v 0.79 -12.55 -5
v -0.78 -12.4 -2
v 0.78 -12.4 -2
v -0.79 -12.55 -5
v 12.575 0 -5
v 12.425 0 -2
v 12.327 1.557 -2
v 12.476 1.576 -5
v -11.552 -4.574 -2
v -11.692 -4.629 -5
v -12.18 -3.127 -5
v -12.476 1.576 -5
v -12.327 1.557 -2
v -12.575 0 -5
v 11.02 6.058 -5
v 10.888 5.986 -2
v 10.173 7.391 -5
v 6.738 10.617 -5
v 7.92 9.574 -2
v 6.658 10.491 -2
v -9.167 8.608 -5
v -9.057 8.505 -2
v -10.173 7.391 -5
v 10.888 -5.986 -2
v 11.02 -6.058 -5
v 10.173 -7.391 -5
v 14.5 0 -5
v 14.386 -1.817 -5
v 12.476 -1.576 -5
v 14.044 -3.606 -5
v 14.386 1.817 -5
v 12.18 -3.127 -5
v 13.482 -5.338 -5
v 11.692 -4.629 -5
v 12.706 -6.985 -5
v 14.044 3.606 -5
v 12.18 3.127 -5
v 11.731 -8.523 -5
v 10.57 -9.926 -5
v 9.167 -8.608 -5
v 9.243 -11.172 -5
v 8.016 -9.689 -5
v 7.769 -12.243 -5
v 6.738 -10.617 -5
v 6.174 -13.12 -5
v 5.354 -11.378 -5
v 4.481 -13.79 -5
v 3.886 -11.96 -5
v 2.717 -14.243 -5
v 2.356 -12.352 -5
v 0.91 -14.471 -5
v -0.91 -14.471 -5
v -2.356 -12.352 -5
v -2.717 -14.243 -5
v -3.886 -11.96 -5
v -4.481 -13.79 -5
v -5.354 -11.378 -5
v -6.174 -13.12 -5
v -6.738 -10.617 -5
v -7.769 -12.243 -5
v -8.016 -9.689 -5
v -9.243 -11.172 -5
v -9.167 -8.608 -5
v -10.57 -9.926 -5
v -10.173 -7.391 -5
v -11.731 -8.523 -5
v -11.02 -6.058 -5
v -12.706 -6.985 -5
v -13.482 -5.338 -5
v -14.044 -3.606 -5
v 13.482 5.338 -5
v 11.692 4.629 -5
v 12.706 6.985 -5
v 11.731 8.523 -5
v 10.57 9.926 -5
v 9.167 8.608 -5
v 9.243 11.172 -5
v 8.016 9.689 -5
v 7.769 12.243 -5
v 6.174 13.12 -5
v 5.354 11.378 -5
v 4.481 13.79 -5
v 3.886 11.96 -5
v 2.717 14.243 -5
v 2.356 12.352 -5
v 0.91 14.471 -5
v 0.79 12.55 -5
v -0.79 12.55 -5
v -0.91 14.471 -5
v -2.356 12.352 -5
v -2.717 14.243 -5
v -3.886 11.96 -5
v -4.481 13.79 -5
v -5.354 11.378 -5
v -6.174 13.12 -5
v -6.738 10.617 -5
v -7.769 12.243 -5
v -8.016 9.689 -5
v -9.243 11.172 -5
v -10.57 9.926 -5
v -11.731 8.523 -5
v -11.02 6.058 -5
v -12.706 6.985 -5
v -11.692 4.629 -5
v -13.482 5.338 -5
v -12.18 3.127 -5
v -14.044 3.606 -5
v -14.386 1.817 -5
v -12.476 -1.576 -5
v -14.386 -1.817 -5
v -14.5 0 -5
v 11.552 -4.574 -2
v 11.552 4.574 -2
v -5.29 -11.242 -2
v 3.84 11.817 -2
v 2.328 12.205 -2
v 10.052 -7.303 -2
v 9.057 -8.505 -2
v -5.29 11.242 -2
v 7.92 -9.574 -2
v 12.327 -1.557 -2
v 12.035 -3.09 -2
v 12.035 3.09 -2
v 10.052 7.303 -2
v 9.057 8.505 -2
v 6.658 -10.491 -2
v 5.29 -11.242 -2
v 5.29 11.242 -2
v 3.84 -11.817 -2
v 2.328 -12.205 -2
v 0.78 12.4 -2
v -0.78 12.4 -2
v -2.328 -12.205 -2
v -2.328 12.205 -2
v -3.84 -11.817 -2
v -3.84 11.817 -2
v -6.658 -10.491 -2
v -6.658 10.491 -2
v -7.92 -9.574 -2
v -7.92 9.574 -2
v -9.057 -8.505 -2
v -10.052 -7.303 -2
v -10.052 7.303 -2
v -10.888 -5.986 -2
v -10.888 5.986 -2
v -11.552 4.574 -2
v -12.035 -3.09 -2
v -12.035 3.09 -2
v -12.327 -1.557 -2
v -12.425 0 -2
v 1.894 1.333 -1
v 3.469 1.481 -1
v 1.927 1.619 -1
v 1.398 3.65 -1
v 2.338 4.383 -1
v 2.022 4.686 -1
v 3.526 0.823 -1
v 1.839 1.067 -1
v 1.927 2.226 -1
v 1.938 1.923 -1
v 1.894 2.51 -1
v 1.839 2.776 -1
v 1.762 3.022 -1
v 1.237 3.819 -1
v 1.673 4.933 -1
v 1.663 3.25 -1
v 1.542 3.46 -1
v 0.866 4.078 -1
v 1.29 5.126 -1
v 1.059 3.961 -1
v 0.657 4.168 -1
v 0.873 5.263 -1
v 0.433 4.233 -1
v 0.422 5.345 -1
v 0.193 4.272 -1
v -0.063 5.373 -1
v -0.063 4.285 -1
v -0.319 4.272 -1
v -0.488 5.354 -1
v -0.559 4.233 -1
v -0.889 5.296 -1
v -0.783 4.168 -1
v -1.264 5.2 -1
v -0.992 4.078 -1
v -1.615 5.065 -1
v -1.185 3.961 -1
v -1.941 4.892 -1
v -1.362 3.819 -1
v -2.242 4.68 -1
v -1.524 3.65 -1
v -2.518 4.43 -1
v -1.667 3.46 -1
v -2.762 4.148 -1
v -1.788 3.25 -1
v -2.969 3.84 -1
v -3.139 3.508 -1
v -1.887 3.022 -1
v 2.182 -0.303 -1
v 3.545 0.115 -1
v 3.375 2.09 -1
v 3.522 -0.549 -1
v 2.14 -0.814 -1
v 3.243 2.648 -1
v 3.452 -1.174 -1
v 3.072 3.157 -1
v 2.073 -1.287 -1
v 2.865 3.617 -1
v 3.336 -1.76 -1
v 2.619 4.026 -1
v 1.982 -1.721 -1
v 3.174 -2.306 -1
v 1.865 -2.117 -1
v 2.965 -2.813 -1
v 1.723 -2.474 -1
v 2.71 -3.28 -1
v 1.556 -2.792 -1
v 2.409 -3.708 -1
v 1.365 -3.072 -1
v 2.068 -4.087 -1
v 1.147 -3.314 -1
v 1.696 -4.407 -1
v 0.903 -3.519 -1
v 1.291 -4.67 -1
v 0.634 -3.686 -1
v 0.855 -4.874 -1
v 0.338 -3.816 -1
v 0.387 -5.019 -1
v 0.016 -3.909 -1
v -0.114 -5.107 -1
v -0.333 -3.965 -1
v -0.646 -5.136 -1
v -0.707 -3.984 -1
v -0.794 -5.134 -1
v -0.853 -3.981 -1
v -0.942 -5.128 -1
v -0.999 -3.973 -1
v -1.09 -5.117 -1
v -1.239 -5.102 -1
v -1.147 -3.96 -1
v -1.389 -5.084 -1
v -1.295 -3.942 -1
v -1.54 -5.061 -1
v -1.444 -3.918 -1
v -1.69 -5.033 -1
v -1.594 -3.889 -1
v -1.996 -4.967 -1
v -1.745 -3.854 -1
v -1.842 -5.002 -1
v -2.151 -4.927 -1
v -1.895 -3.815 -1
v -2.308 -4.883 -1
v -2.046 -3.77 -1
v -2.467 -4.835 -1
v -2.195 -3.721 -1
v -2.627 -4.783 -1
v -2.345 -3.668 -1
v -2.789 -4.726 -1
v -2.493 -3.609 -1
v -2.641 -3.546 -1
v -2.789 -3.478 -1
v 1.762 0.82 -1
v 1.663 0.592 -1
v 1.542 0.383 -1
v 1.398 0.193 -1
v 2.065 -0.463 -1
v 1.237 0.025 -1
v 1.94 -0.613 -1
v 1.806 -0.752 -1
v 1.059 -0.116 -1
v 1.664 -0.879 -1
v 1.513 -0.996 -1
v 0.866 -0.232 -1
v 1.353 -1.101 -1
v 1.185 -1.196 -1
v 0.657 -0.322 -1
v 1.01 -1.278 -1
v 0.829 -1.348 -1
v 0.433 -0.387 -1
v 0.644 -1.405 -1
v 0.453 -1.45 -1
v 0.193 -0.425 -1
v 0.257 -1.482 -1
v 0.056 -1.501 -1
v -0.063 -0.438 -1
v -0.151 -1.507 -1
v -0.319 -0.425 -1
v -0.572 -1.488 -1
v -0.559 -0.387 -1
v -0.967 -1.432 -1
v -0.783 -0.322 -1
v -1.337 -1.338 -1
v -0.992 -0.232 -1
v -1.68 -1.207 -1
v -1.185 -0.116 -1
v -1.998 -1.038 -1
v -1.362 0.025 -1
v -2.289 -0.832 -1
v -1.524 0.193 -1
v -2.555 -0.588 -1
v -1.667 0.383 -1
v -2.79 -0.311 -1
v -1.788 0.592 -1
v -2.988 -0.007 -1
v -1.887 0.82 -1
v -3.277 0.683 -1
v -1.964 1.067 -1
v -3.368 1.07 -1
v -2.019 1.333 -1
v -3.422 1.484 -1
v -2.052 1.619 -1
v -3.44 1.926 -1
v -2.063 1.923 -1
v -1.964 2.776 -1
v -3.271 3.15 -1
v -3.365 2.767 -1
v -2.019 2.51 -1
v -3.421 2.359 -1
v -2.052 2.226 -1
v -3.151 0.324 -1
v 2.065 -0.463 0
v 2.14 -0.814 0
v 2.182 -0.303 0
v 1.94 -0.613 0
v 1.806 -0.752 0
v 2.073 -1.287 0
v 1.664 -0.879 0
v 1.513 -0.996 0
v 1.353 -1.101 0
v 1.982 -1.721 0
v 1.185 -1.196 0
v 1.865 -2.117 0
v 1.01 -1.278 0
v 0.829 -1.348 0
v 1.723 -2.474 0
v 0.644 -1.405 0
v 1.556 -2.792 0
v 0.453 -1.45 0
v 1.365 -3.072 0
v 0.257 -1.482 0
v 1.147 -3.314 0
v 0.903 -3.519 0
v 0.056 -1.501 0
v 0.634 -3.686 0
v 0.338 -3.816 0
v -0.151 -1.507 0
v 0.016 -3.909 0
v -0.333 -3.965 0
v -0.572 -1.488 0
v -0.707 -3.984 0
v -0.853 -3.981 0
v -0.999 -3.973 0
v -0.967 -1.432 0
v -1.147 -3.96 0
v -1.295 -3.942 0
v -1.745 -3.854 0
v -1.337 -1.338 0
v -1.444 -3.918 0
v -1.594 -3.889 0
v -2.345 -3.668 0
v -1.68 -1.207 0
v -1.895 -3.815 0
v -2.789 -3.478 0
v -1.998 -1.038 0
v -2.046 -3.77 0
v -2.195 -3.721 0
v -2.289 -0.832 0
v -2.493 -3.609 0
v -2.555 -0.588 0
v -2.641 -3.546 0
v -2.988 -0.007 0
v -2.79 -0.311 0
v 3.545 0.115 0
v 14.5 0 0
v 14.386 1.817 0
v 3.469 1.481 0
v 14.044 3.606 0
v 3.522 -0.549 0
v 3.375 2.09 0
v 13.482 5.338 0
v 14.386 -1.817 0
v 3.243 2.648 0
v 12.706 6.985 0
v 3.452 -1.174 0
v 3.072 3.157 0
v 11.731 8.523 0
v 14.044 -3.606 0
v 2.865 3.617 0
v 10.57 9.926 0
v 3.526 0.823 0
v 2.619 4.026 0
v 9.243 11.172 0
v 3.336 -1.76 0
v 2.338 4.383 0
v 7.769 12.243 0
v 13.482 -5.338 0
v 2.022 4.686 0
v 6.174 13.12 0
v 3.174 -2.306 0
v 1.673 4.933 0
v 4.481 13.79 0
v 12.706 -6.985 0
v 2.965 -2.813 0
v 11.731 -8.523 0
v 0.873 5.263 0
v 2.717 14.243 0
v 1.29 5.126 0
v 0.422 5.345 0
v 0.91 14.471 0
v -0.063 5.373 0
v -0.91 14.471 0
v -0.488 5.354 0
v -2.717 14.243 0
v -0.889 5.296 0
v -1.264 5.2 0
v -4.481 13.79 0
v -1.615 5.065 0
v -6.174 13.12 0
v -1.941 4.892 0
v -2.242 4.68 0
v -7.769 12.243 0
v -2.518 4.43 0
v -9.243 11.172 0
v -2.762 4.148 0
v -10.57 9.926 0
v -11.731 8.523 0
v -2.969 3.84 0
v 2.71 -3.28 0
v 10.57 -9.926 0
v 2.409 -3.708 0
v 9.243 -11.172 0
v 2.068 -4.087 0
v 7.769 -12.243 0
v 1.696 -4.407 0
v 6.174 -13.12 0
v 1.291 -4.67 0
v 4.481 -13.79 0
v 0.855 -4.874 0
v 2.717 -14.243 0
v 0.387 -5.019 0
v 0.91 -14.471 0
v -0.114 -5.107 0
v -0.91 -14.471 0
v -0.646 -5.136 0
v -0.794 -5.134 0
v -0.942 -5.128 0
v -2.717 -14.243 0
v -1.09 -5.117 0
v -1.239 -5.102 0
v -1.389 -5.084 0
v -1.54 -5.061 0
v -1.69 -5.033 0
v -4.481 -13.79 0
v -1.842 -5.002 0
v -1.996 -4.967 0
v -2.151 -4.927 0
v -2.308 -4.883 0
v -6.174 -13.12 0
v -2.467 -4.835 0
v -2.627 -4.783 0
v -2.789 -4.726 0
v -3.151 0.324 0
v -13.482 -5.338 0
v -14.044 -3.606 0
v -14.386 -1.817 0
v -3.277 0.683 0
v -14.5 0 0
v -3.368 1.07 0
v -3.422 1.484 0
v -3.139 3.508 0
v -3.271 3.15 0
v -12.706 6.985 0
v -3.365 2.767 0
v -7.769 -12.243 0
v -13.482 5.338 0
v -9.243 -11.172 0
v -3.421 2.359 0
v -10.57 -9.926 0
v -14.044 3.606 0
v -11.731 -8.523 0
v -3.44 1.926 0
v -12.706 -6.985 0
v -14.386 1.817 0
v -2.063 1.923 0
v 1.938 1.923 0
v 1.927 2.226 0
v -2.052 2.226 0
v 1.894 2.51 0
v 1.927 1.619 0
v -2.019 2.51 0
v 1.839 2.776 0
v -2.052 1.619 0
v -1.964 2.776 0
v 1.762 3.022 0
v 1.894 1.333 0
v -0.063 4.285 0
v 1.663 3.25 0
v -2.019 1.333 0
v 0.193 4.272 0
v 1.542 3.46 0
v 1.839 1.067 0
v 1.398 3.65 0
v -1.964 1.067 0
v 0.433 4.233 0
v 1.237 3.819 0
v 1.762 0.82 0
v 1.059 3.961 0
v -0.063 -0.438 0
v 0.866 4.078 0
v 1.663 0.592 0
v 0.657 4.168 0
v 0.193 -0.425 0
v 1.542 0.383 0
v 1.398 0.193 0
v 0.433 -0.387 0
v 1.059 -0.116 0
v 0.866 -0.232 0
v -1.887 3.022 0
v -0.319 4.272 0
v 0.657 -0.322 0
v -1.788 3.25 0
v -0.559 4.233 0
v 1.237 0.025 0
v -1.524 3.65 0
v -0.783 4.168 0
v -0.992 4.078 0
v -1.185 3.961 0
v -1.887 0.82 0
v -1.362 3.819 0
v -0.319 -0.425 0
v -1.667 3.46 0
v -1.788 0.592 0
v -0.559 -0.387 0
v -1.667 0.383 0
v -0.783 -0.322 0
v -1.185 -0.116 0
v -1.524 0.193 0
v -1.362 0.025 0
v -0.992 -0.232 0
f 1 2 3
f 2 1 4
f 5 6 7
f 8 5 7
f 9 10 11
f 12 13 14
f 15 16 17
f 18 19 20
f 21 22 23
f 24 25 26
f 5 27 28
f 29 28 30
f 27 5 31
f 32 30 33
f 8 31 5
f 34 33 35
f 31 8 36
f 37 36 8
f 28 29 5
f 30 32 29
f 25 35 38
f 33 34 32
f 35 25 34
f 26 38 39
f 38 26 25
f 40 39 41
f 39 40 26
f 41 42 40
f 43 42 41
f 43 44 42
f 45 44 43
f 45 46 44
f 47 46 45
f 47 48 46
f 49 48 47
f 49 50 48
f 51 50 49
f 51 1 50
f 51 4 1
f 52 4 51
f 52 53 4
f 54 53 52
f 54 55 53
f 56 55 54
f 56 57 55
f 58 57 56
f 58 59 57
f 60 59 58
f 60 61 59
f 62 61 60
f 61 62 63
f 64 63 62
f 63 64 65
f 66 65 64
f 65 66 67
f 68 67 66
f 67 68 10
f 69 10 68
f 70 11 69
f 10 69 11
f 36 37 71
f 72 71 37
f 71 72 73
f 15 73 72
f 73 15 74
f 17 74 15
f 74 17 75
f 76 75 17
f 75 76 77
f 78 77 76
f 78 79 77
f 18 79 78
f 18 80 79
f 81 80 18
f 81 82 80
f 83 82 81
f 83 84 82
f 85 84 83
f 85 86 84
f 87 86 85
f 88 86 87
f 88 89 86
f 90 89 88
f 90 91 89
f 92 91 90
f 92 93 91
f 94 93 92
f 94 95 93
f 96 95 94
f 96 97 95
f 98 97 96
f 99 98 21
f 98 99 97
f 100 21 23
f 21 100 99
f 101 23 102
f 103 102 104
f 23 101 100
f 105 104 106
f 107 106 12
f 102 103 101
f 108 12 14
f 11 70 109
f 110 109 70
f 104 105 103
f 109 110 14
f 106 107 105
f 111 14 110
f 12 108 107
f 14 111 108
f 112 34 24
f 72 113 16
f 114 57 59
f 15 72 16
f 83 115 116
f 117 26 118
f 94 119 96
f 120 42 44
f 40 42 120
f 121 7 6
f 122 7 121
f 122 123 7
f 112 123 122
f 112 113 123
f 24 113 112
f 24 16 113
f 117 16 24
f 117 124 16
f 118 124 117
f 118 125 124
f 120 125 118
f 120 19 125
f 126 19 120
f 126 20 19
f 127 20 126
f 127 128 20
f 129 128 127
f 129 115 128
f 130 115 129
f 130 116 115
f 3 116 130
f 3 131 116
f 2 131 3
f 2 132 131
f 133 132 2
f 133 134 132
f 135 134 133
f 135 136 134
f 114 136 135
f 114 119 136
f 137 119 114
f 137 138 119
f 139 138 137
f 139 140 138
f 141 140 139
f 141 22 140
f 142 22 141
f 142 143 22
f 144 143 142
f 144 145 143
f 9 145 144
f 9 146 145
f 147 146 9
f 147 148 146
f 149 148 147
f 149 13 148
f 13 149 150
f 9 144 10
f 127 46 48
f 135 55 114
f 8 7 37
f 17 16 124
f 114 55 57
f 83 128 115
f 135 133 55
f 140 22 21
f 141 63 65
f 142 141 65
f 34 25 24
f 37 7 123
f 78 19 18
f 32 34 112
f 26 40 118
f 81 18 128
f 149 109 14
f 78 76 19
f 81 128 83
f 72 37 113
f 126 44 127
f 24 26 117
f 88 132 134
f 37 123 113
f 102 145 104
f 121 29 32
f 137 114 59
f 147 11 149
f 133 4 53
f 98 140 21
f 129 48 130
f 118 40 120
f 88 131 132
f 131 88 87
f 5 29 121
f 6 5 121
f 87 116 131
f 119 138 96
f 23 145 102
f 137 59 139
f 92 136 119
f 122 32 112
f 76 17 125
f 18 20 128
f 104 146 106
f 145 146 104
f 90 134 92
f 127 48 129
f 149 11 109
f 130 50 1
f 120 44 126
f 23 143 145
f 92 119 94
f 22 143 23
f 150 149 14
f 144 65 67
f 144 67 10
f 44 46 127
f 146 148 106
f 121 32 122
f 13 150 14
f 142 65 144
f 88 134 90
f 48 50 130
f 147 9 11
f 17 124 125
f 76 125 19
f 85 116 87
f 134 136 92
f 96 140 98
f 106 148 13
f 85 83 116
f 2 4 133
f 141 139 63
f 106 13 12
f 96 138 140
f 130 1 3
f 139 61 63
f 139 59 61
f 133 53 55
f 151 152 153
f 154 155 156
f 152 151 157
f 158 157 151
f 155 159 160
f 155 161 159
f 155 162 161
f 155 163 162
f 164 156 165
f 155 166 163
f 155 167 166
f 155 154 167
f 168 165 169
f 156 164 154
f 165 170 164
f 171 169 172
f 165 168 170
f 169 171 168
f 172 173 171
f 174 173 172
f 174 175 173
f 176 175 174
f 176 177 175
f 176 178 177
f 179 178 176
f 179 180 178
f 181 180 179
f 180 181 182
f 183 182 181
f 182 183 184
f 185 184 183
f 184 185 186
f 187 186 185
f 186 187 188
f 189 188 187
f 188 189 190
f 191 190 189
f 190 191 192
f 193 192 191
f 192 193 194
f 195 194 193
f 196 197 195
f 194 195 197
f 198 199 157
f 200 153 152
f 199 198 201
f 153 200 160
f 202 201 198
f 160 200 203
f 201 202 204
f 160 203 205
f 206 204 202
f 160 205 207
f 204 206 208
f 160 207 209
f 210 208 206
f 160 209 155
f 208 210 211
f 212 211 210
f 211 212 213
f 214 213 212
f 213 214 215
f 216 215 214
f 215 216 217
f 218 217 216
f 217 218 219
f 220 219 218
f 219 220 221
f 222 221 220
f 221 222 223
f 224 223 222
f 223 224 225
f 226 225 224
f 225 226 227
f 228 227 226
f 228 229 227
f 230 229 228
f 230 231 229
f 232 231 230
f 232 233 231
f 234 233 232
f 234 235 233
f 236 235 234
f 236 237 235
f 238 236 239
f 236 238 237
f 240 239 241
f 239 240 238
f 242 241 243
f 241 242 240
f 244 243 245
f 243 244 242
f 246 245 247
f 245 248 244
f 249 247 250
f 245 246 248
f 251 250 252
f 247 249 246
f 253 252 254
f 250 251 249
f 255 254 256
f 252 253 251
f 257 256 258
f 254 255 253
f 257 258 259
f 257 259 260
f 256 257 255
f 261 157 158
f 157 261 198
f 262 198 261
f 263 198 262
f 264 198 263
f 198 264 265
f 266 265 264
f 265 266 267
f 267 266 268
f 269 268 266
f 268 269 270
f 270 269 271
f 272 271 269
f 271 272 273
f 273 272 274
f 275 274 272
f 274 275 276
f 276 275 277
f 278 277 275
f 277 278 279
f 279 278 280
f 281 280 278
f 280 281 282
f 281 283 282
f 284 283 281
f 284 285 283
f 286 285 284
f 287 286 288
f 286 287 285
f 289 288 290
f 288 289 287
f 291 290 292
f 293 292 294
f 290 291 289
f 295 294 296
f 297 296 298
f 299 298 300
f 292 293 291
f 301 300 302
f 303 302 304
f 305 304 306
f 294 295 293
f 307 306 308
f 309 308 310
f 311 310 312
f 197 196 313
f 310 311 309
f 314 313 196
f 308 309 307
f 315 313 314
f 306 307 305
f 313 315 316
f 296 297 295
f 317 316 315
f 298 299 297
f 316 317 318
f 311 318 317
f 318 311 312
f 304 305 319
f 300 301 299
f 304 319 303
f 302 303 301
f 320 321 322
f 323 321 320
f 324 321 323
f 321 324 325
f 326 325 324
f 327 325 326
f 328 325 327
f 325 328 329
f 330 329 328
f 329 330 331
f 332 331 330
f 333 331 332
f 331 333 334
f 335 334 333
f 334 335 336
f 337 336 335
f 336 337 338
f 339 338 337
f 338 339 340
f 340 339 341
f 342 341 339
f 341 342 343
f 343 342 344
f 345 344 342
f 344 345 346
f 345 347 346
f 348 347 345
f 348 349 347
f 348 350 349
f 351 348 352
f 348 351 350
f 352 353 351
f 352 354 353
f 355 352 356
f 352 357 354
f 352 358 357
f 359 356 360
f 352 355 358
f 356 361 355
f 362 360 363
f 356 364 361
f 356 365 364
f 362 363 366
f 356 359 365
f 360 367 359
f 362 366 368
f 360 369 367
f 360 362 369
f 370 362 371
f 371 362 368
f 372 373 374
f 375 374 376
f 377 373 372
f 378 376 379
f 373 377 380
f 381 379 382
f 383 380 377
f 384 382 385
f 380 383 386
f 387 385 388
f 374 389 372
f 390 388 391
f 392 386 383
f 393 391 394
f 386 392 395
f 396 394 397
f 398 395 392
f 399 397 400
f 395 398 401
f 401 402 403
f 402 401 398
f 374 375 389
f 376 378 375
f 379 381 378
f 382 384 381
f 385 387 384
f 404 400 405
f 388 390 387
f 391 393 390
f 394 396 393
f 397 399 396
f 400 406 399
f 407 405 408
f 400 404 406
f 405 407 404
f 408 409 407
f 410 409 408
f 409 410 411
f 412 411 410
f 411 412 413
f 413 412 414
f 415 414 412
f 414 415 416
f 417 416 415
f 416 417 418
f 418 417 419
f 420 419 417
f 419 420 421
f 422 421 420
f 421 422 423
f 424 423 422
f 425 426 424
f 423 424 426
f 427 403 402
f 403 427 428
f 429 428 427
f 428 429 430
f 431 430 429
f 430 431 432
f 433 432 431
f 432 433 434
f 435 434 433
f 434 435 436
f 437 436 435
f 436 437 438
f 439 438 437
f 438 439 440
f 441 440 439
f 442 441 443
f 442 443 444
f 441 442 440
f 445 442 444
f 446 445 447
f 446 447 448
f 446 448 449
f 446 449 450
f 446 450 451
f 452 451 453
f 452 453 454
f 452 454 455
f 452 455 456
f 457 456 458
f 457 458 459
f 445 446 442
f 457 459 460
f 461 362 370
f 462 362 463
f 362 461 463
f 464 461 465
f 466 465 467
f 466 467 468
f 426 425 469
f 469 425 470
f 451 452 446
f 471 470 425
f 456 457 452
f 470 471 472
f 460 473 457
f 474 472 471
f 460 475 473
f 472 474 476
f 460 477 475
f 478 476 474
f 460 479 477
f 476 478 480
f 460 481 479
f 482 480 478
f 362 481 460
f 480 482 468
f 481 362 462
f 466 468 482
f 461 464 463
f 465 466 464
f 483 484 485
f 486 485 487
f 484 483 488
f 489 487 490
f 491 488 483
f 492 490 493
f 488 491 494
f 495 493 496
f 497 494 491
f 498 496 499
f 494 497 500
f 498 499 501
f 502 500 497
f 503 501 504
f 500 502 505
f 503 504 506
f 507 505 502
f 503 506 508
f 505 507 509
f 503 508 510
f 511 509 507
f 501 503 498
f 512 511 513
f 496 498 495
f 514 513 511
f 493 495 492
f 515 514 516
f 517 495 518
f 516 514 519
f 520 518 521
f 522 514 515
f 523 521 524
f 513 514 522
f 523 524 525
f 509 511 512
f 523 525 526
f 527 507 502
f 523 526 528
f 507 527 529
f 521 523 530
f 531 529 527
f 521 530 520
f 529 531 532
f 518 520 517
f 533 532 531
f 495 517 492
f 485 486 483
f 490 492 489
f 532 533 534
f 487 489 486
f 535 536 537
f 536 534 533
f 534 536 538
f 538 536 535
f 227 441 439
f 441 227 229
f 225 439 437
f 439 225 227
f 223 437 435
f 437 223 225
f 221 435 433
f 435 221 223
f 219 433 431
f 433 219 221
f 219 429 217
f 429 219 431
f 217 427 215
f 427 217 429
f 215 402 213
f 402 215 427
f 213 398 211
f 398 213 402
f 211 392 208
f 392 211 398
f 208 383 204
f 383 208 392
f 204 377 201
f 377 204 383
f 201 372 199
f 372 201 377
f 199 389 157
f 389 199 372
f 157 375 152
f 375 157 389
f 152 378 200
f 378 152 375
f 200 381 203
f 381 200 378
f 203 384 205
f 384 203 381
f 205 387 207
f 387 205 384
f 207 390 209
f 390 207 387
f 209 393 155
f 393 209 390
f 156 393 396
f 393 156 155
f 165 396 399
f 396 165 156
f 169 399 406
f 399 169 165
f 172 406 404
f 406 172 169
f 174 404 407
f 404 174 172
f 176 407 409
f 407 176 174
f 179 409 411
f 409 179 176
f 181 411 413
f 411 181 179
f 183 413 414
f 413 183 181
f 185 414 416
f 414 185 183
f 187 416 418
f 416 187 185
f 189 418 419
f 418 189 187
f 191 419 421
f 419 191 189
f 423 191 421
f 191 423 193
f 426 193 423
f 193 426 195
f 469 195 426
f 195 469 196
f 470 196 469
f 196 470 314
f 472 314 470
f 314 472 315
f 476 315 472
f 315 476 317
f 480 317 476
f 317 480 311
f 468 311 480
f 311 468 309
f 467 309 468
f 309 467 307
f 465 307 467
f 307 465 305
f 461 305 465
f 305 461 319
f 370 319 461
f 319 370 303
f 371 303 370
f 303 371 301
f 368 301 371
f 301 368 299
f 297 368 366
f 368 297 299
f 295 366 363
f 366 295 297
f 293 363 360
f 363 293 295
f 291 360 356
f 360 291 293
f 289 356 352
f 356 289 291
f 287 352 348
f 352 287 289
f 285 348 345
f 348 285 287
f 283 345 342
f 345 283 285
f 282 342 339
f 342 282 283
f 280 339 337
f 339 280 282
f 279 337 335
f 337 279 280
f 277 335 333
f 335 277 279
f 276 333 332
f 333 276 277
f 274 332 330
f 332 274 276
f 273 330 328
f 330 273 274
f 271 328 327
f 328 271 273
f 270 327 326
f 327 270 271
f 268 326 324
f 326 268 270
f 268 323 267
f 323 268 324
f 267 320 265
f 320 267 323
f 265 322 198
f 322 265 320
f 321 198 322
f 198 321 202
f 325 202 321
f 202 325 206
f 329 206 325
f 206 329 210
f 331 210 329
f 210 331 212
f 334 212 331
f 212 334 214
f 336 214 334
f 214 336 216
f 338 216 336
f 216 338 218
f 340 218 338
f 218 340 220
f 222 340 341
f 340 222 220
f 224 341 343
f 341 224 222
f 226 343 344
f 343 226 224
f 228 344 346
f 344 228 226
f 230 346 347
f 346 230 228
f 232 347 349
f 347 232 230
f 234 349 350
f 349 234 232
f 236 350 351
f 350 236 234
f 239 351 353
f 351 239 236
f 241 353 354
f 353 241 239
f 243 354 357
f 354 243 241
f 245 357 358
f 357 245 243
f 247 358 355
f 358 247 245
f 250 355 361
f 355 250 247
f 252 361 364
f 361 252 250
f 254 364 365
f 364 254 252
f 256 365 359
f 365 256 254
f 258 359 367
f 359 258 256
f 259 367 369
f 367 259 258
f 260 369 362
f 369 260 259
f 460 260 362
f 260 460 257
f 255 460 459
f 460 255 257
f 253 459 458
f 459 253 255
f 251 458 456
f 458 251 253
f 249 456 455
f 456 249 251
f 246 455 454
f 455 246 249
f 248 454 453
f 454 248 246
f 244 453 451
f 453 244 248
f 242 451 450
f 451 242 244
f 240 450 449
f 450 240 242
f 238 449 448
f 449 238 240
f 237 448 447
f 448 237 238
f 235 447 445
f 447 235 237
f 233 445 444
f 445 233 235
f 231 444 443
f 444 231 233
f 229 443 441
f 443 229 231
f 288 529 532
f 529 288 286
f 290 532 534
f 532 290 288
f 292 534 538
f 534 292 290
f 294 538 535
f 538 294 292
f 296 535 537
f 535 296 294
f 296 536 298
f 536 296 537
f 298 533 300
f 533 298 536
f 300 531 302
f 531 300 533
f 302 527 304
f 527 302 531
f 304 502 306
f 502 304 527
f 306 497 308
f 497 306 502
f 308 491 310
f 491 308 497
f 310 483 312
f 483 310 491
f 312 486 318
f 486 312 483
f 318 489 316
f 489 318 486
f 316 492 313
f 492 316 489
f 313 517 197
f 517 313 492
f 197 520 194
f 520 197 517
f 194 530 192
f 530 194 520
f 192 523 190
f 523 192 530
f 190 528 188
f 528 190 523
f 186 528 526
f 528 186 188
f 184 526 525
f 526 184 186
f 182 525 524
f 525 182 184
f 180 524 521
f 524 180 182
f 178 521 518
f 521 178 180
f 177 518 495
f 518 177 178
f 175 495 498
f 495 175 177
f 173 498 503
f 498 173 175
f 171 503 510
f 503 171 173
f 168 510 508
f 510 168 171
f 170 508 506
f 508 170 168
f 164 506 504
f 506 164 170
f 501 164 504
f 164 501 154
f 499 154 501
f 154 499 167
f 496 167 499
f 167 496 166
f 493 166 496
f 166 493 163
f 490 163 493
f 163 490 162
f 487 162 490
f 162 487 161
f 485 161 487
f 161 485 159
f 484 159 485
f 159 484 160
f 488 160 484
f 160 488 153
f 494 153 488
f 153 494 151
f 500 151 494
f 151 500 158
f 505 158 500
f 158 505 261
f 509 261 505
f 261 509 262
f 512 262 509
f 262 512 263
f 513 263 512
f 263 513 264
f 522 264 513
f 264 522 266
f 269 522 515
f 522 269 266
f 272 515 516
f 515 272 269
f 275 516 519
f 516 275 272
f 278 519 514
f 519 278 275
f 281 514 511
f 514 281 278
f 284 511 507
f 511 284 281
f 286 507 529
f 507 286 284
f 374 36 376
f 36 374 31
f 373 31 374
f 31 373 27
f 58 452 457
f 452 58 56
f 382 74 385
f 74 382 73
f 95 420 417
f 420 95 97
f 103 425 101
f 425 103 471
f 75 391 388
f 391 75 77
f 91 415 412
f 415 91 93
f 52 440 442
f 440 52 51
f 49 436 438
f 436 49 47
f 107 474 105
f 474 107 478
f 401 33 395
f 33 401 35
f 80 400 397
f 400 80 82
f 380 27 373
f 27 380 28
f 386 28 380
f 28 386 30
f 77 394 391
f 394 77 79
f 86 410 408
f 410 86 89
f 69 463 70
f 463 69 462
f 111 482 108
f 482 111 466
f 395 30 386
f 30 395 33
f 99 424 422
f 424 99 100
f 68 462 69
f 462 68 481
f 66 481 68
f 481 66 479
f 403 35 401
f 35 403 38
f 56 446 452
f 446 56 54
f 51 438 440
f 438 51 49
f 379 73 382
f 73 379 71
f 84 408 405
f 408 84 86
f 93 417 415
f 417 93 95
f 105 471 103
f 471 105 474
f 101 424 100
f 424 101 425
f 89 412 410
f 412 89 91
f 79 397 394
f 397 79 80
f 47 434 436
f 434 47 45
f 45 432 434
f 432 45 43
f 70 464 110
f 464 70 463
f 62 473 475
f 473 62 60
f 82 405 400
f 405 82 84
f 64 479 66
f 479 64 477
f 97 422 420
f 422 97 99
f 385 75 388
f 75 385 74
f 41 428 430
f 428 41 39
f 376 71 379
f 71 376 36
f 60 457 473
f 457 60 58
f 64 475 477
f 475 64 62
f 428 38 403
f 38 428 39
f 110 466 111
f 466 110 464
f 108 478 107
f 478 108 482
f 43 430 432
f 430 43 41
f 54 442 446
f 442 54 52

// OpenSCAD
$fn = 50;

difference() {
	union() {
		translate(v = [0, 0, -5.0]) {
			cylinder(h = 5, r = 14.5);
		}
	}
	union() {
		#translate(v = [0, 0, -5.0]) {
			cylinder(h = 3, r1 = 12.575, r2 = 12.425);
		}
		translate(v = [0, 0, -1]) {
			linear_extrude(height = 1) {
				text(font = "Impact", halign = "center", size = 10, text = "9", valign = "center");
			}
		}
	}
}
